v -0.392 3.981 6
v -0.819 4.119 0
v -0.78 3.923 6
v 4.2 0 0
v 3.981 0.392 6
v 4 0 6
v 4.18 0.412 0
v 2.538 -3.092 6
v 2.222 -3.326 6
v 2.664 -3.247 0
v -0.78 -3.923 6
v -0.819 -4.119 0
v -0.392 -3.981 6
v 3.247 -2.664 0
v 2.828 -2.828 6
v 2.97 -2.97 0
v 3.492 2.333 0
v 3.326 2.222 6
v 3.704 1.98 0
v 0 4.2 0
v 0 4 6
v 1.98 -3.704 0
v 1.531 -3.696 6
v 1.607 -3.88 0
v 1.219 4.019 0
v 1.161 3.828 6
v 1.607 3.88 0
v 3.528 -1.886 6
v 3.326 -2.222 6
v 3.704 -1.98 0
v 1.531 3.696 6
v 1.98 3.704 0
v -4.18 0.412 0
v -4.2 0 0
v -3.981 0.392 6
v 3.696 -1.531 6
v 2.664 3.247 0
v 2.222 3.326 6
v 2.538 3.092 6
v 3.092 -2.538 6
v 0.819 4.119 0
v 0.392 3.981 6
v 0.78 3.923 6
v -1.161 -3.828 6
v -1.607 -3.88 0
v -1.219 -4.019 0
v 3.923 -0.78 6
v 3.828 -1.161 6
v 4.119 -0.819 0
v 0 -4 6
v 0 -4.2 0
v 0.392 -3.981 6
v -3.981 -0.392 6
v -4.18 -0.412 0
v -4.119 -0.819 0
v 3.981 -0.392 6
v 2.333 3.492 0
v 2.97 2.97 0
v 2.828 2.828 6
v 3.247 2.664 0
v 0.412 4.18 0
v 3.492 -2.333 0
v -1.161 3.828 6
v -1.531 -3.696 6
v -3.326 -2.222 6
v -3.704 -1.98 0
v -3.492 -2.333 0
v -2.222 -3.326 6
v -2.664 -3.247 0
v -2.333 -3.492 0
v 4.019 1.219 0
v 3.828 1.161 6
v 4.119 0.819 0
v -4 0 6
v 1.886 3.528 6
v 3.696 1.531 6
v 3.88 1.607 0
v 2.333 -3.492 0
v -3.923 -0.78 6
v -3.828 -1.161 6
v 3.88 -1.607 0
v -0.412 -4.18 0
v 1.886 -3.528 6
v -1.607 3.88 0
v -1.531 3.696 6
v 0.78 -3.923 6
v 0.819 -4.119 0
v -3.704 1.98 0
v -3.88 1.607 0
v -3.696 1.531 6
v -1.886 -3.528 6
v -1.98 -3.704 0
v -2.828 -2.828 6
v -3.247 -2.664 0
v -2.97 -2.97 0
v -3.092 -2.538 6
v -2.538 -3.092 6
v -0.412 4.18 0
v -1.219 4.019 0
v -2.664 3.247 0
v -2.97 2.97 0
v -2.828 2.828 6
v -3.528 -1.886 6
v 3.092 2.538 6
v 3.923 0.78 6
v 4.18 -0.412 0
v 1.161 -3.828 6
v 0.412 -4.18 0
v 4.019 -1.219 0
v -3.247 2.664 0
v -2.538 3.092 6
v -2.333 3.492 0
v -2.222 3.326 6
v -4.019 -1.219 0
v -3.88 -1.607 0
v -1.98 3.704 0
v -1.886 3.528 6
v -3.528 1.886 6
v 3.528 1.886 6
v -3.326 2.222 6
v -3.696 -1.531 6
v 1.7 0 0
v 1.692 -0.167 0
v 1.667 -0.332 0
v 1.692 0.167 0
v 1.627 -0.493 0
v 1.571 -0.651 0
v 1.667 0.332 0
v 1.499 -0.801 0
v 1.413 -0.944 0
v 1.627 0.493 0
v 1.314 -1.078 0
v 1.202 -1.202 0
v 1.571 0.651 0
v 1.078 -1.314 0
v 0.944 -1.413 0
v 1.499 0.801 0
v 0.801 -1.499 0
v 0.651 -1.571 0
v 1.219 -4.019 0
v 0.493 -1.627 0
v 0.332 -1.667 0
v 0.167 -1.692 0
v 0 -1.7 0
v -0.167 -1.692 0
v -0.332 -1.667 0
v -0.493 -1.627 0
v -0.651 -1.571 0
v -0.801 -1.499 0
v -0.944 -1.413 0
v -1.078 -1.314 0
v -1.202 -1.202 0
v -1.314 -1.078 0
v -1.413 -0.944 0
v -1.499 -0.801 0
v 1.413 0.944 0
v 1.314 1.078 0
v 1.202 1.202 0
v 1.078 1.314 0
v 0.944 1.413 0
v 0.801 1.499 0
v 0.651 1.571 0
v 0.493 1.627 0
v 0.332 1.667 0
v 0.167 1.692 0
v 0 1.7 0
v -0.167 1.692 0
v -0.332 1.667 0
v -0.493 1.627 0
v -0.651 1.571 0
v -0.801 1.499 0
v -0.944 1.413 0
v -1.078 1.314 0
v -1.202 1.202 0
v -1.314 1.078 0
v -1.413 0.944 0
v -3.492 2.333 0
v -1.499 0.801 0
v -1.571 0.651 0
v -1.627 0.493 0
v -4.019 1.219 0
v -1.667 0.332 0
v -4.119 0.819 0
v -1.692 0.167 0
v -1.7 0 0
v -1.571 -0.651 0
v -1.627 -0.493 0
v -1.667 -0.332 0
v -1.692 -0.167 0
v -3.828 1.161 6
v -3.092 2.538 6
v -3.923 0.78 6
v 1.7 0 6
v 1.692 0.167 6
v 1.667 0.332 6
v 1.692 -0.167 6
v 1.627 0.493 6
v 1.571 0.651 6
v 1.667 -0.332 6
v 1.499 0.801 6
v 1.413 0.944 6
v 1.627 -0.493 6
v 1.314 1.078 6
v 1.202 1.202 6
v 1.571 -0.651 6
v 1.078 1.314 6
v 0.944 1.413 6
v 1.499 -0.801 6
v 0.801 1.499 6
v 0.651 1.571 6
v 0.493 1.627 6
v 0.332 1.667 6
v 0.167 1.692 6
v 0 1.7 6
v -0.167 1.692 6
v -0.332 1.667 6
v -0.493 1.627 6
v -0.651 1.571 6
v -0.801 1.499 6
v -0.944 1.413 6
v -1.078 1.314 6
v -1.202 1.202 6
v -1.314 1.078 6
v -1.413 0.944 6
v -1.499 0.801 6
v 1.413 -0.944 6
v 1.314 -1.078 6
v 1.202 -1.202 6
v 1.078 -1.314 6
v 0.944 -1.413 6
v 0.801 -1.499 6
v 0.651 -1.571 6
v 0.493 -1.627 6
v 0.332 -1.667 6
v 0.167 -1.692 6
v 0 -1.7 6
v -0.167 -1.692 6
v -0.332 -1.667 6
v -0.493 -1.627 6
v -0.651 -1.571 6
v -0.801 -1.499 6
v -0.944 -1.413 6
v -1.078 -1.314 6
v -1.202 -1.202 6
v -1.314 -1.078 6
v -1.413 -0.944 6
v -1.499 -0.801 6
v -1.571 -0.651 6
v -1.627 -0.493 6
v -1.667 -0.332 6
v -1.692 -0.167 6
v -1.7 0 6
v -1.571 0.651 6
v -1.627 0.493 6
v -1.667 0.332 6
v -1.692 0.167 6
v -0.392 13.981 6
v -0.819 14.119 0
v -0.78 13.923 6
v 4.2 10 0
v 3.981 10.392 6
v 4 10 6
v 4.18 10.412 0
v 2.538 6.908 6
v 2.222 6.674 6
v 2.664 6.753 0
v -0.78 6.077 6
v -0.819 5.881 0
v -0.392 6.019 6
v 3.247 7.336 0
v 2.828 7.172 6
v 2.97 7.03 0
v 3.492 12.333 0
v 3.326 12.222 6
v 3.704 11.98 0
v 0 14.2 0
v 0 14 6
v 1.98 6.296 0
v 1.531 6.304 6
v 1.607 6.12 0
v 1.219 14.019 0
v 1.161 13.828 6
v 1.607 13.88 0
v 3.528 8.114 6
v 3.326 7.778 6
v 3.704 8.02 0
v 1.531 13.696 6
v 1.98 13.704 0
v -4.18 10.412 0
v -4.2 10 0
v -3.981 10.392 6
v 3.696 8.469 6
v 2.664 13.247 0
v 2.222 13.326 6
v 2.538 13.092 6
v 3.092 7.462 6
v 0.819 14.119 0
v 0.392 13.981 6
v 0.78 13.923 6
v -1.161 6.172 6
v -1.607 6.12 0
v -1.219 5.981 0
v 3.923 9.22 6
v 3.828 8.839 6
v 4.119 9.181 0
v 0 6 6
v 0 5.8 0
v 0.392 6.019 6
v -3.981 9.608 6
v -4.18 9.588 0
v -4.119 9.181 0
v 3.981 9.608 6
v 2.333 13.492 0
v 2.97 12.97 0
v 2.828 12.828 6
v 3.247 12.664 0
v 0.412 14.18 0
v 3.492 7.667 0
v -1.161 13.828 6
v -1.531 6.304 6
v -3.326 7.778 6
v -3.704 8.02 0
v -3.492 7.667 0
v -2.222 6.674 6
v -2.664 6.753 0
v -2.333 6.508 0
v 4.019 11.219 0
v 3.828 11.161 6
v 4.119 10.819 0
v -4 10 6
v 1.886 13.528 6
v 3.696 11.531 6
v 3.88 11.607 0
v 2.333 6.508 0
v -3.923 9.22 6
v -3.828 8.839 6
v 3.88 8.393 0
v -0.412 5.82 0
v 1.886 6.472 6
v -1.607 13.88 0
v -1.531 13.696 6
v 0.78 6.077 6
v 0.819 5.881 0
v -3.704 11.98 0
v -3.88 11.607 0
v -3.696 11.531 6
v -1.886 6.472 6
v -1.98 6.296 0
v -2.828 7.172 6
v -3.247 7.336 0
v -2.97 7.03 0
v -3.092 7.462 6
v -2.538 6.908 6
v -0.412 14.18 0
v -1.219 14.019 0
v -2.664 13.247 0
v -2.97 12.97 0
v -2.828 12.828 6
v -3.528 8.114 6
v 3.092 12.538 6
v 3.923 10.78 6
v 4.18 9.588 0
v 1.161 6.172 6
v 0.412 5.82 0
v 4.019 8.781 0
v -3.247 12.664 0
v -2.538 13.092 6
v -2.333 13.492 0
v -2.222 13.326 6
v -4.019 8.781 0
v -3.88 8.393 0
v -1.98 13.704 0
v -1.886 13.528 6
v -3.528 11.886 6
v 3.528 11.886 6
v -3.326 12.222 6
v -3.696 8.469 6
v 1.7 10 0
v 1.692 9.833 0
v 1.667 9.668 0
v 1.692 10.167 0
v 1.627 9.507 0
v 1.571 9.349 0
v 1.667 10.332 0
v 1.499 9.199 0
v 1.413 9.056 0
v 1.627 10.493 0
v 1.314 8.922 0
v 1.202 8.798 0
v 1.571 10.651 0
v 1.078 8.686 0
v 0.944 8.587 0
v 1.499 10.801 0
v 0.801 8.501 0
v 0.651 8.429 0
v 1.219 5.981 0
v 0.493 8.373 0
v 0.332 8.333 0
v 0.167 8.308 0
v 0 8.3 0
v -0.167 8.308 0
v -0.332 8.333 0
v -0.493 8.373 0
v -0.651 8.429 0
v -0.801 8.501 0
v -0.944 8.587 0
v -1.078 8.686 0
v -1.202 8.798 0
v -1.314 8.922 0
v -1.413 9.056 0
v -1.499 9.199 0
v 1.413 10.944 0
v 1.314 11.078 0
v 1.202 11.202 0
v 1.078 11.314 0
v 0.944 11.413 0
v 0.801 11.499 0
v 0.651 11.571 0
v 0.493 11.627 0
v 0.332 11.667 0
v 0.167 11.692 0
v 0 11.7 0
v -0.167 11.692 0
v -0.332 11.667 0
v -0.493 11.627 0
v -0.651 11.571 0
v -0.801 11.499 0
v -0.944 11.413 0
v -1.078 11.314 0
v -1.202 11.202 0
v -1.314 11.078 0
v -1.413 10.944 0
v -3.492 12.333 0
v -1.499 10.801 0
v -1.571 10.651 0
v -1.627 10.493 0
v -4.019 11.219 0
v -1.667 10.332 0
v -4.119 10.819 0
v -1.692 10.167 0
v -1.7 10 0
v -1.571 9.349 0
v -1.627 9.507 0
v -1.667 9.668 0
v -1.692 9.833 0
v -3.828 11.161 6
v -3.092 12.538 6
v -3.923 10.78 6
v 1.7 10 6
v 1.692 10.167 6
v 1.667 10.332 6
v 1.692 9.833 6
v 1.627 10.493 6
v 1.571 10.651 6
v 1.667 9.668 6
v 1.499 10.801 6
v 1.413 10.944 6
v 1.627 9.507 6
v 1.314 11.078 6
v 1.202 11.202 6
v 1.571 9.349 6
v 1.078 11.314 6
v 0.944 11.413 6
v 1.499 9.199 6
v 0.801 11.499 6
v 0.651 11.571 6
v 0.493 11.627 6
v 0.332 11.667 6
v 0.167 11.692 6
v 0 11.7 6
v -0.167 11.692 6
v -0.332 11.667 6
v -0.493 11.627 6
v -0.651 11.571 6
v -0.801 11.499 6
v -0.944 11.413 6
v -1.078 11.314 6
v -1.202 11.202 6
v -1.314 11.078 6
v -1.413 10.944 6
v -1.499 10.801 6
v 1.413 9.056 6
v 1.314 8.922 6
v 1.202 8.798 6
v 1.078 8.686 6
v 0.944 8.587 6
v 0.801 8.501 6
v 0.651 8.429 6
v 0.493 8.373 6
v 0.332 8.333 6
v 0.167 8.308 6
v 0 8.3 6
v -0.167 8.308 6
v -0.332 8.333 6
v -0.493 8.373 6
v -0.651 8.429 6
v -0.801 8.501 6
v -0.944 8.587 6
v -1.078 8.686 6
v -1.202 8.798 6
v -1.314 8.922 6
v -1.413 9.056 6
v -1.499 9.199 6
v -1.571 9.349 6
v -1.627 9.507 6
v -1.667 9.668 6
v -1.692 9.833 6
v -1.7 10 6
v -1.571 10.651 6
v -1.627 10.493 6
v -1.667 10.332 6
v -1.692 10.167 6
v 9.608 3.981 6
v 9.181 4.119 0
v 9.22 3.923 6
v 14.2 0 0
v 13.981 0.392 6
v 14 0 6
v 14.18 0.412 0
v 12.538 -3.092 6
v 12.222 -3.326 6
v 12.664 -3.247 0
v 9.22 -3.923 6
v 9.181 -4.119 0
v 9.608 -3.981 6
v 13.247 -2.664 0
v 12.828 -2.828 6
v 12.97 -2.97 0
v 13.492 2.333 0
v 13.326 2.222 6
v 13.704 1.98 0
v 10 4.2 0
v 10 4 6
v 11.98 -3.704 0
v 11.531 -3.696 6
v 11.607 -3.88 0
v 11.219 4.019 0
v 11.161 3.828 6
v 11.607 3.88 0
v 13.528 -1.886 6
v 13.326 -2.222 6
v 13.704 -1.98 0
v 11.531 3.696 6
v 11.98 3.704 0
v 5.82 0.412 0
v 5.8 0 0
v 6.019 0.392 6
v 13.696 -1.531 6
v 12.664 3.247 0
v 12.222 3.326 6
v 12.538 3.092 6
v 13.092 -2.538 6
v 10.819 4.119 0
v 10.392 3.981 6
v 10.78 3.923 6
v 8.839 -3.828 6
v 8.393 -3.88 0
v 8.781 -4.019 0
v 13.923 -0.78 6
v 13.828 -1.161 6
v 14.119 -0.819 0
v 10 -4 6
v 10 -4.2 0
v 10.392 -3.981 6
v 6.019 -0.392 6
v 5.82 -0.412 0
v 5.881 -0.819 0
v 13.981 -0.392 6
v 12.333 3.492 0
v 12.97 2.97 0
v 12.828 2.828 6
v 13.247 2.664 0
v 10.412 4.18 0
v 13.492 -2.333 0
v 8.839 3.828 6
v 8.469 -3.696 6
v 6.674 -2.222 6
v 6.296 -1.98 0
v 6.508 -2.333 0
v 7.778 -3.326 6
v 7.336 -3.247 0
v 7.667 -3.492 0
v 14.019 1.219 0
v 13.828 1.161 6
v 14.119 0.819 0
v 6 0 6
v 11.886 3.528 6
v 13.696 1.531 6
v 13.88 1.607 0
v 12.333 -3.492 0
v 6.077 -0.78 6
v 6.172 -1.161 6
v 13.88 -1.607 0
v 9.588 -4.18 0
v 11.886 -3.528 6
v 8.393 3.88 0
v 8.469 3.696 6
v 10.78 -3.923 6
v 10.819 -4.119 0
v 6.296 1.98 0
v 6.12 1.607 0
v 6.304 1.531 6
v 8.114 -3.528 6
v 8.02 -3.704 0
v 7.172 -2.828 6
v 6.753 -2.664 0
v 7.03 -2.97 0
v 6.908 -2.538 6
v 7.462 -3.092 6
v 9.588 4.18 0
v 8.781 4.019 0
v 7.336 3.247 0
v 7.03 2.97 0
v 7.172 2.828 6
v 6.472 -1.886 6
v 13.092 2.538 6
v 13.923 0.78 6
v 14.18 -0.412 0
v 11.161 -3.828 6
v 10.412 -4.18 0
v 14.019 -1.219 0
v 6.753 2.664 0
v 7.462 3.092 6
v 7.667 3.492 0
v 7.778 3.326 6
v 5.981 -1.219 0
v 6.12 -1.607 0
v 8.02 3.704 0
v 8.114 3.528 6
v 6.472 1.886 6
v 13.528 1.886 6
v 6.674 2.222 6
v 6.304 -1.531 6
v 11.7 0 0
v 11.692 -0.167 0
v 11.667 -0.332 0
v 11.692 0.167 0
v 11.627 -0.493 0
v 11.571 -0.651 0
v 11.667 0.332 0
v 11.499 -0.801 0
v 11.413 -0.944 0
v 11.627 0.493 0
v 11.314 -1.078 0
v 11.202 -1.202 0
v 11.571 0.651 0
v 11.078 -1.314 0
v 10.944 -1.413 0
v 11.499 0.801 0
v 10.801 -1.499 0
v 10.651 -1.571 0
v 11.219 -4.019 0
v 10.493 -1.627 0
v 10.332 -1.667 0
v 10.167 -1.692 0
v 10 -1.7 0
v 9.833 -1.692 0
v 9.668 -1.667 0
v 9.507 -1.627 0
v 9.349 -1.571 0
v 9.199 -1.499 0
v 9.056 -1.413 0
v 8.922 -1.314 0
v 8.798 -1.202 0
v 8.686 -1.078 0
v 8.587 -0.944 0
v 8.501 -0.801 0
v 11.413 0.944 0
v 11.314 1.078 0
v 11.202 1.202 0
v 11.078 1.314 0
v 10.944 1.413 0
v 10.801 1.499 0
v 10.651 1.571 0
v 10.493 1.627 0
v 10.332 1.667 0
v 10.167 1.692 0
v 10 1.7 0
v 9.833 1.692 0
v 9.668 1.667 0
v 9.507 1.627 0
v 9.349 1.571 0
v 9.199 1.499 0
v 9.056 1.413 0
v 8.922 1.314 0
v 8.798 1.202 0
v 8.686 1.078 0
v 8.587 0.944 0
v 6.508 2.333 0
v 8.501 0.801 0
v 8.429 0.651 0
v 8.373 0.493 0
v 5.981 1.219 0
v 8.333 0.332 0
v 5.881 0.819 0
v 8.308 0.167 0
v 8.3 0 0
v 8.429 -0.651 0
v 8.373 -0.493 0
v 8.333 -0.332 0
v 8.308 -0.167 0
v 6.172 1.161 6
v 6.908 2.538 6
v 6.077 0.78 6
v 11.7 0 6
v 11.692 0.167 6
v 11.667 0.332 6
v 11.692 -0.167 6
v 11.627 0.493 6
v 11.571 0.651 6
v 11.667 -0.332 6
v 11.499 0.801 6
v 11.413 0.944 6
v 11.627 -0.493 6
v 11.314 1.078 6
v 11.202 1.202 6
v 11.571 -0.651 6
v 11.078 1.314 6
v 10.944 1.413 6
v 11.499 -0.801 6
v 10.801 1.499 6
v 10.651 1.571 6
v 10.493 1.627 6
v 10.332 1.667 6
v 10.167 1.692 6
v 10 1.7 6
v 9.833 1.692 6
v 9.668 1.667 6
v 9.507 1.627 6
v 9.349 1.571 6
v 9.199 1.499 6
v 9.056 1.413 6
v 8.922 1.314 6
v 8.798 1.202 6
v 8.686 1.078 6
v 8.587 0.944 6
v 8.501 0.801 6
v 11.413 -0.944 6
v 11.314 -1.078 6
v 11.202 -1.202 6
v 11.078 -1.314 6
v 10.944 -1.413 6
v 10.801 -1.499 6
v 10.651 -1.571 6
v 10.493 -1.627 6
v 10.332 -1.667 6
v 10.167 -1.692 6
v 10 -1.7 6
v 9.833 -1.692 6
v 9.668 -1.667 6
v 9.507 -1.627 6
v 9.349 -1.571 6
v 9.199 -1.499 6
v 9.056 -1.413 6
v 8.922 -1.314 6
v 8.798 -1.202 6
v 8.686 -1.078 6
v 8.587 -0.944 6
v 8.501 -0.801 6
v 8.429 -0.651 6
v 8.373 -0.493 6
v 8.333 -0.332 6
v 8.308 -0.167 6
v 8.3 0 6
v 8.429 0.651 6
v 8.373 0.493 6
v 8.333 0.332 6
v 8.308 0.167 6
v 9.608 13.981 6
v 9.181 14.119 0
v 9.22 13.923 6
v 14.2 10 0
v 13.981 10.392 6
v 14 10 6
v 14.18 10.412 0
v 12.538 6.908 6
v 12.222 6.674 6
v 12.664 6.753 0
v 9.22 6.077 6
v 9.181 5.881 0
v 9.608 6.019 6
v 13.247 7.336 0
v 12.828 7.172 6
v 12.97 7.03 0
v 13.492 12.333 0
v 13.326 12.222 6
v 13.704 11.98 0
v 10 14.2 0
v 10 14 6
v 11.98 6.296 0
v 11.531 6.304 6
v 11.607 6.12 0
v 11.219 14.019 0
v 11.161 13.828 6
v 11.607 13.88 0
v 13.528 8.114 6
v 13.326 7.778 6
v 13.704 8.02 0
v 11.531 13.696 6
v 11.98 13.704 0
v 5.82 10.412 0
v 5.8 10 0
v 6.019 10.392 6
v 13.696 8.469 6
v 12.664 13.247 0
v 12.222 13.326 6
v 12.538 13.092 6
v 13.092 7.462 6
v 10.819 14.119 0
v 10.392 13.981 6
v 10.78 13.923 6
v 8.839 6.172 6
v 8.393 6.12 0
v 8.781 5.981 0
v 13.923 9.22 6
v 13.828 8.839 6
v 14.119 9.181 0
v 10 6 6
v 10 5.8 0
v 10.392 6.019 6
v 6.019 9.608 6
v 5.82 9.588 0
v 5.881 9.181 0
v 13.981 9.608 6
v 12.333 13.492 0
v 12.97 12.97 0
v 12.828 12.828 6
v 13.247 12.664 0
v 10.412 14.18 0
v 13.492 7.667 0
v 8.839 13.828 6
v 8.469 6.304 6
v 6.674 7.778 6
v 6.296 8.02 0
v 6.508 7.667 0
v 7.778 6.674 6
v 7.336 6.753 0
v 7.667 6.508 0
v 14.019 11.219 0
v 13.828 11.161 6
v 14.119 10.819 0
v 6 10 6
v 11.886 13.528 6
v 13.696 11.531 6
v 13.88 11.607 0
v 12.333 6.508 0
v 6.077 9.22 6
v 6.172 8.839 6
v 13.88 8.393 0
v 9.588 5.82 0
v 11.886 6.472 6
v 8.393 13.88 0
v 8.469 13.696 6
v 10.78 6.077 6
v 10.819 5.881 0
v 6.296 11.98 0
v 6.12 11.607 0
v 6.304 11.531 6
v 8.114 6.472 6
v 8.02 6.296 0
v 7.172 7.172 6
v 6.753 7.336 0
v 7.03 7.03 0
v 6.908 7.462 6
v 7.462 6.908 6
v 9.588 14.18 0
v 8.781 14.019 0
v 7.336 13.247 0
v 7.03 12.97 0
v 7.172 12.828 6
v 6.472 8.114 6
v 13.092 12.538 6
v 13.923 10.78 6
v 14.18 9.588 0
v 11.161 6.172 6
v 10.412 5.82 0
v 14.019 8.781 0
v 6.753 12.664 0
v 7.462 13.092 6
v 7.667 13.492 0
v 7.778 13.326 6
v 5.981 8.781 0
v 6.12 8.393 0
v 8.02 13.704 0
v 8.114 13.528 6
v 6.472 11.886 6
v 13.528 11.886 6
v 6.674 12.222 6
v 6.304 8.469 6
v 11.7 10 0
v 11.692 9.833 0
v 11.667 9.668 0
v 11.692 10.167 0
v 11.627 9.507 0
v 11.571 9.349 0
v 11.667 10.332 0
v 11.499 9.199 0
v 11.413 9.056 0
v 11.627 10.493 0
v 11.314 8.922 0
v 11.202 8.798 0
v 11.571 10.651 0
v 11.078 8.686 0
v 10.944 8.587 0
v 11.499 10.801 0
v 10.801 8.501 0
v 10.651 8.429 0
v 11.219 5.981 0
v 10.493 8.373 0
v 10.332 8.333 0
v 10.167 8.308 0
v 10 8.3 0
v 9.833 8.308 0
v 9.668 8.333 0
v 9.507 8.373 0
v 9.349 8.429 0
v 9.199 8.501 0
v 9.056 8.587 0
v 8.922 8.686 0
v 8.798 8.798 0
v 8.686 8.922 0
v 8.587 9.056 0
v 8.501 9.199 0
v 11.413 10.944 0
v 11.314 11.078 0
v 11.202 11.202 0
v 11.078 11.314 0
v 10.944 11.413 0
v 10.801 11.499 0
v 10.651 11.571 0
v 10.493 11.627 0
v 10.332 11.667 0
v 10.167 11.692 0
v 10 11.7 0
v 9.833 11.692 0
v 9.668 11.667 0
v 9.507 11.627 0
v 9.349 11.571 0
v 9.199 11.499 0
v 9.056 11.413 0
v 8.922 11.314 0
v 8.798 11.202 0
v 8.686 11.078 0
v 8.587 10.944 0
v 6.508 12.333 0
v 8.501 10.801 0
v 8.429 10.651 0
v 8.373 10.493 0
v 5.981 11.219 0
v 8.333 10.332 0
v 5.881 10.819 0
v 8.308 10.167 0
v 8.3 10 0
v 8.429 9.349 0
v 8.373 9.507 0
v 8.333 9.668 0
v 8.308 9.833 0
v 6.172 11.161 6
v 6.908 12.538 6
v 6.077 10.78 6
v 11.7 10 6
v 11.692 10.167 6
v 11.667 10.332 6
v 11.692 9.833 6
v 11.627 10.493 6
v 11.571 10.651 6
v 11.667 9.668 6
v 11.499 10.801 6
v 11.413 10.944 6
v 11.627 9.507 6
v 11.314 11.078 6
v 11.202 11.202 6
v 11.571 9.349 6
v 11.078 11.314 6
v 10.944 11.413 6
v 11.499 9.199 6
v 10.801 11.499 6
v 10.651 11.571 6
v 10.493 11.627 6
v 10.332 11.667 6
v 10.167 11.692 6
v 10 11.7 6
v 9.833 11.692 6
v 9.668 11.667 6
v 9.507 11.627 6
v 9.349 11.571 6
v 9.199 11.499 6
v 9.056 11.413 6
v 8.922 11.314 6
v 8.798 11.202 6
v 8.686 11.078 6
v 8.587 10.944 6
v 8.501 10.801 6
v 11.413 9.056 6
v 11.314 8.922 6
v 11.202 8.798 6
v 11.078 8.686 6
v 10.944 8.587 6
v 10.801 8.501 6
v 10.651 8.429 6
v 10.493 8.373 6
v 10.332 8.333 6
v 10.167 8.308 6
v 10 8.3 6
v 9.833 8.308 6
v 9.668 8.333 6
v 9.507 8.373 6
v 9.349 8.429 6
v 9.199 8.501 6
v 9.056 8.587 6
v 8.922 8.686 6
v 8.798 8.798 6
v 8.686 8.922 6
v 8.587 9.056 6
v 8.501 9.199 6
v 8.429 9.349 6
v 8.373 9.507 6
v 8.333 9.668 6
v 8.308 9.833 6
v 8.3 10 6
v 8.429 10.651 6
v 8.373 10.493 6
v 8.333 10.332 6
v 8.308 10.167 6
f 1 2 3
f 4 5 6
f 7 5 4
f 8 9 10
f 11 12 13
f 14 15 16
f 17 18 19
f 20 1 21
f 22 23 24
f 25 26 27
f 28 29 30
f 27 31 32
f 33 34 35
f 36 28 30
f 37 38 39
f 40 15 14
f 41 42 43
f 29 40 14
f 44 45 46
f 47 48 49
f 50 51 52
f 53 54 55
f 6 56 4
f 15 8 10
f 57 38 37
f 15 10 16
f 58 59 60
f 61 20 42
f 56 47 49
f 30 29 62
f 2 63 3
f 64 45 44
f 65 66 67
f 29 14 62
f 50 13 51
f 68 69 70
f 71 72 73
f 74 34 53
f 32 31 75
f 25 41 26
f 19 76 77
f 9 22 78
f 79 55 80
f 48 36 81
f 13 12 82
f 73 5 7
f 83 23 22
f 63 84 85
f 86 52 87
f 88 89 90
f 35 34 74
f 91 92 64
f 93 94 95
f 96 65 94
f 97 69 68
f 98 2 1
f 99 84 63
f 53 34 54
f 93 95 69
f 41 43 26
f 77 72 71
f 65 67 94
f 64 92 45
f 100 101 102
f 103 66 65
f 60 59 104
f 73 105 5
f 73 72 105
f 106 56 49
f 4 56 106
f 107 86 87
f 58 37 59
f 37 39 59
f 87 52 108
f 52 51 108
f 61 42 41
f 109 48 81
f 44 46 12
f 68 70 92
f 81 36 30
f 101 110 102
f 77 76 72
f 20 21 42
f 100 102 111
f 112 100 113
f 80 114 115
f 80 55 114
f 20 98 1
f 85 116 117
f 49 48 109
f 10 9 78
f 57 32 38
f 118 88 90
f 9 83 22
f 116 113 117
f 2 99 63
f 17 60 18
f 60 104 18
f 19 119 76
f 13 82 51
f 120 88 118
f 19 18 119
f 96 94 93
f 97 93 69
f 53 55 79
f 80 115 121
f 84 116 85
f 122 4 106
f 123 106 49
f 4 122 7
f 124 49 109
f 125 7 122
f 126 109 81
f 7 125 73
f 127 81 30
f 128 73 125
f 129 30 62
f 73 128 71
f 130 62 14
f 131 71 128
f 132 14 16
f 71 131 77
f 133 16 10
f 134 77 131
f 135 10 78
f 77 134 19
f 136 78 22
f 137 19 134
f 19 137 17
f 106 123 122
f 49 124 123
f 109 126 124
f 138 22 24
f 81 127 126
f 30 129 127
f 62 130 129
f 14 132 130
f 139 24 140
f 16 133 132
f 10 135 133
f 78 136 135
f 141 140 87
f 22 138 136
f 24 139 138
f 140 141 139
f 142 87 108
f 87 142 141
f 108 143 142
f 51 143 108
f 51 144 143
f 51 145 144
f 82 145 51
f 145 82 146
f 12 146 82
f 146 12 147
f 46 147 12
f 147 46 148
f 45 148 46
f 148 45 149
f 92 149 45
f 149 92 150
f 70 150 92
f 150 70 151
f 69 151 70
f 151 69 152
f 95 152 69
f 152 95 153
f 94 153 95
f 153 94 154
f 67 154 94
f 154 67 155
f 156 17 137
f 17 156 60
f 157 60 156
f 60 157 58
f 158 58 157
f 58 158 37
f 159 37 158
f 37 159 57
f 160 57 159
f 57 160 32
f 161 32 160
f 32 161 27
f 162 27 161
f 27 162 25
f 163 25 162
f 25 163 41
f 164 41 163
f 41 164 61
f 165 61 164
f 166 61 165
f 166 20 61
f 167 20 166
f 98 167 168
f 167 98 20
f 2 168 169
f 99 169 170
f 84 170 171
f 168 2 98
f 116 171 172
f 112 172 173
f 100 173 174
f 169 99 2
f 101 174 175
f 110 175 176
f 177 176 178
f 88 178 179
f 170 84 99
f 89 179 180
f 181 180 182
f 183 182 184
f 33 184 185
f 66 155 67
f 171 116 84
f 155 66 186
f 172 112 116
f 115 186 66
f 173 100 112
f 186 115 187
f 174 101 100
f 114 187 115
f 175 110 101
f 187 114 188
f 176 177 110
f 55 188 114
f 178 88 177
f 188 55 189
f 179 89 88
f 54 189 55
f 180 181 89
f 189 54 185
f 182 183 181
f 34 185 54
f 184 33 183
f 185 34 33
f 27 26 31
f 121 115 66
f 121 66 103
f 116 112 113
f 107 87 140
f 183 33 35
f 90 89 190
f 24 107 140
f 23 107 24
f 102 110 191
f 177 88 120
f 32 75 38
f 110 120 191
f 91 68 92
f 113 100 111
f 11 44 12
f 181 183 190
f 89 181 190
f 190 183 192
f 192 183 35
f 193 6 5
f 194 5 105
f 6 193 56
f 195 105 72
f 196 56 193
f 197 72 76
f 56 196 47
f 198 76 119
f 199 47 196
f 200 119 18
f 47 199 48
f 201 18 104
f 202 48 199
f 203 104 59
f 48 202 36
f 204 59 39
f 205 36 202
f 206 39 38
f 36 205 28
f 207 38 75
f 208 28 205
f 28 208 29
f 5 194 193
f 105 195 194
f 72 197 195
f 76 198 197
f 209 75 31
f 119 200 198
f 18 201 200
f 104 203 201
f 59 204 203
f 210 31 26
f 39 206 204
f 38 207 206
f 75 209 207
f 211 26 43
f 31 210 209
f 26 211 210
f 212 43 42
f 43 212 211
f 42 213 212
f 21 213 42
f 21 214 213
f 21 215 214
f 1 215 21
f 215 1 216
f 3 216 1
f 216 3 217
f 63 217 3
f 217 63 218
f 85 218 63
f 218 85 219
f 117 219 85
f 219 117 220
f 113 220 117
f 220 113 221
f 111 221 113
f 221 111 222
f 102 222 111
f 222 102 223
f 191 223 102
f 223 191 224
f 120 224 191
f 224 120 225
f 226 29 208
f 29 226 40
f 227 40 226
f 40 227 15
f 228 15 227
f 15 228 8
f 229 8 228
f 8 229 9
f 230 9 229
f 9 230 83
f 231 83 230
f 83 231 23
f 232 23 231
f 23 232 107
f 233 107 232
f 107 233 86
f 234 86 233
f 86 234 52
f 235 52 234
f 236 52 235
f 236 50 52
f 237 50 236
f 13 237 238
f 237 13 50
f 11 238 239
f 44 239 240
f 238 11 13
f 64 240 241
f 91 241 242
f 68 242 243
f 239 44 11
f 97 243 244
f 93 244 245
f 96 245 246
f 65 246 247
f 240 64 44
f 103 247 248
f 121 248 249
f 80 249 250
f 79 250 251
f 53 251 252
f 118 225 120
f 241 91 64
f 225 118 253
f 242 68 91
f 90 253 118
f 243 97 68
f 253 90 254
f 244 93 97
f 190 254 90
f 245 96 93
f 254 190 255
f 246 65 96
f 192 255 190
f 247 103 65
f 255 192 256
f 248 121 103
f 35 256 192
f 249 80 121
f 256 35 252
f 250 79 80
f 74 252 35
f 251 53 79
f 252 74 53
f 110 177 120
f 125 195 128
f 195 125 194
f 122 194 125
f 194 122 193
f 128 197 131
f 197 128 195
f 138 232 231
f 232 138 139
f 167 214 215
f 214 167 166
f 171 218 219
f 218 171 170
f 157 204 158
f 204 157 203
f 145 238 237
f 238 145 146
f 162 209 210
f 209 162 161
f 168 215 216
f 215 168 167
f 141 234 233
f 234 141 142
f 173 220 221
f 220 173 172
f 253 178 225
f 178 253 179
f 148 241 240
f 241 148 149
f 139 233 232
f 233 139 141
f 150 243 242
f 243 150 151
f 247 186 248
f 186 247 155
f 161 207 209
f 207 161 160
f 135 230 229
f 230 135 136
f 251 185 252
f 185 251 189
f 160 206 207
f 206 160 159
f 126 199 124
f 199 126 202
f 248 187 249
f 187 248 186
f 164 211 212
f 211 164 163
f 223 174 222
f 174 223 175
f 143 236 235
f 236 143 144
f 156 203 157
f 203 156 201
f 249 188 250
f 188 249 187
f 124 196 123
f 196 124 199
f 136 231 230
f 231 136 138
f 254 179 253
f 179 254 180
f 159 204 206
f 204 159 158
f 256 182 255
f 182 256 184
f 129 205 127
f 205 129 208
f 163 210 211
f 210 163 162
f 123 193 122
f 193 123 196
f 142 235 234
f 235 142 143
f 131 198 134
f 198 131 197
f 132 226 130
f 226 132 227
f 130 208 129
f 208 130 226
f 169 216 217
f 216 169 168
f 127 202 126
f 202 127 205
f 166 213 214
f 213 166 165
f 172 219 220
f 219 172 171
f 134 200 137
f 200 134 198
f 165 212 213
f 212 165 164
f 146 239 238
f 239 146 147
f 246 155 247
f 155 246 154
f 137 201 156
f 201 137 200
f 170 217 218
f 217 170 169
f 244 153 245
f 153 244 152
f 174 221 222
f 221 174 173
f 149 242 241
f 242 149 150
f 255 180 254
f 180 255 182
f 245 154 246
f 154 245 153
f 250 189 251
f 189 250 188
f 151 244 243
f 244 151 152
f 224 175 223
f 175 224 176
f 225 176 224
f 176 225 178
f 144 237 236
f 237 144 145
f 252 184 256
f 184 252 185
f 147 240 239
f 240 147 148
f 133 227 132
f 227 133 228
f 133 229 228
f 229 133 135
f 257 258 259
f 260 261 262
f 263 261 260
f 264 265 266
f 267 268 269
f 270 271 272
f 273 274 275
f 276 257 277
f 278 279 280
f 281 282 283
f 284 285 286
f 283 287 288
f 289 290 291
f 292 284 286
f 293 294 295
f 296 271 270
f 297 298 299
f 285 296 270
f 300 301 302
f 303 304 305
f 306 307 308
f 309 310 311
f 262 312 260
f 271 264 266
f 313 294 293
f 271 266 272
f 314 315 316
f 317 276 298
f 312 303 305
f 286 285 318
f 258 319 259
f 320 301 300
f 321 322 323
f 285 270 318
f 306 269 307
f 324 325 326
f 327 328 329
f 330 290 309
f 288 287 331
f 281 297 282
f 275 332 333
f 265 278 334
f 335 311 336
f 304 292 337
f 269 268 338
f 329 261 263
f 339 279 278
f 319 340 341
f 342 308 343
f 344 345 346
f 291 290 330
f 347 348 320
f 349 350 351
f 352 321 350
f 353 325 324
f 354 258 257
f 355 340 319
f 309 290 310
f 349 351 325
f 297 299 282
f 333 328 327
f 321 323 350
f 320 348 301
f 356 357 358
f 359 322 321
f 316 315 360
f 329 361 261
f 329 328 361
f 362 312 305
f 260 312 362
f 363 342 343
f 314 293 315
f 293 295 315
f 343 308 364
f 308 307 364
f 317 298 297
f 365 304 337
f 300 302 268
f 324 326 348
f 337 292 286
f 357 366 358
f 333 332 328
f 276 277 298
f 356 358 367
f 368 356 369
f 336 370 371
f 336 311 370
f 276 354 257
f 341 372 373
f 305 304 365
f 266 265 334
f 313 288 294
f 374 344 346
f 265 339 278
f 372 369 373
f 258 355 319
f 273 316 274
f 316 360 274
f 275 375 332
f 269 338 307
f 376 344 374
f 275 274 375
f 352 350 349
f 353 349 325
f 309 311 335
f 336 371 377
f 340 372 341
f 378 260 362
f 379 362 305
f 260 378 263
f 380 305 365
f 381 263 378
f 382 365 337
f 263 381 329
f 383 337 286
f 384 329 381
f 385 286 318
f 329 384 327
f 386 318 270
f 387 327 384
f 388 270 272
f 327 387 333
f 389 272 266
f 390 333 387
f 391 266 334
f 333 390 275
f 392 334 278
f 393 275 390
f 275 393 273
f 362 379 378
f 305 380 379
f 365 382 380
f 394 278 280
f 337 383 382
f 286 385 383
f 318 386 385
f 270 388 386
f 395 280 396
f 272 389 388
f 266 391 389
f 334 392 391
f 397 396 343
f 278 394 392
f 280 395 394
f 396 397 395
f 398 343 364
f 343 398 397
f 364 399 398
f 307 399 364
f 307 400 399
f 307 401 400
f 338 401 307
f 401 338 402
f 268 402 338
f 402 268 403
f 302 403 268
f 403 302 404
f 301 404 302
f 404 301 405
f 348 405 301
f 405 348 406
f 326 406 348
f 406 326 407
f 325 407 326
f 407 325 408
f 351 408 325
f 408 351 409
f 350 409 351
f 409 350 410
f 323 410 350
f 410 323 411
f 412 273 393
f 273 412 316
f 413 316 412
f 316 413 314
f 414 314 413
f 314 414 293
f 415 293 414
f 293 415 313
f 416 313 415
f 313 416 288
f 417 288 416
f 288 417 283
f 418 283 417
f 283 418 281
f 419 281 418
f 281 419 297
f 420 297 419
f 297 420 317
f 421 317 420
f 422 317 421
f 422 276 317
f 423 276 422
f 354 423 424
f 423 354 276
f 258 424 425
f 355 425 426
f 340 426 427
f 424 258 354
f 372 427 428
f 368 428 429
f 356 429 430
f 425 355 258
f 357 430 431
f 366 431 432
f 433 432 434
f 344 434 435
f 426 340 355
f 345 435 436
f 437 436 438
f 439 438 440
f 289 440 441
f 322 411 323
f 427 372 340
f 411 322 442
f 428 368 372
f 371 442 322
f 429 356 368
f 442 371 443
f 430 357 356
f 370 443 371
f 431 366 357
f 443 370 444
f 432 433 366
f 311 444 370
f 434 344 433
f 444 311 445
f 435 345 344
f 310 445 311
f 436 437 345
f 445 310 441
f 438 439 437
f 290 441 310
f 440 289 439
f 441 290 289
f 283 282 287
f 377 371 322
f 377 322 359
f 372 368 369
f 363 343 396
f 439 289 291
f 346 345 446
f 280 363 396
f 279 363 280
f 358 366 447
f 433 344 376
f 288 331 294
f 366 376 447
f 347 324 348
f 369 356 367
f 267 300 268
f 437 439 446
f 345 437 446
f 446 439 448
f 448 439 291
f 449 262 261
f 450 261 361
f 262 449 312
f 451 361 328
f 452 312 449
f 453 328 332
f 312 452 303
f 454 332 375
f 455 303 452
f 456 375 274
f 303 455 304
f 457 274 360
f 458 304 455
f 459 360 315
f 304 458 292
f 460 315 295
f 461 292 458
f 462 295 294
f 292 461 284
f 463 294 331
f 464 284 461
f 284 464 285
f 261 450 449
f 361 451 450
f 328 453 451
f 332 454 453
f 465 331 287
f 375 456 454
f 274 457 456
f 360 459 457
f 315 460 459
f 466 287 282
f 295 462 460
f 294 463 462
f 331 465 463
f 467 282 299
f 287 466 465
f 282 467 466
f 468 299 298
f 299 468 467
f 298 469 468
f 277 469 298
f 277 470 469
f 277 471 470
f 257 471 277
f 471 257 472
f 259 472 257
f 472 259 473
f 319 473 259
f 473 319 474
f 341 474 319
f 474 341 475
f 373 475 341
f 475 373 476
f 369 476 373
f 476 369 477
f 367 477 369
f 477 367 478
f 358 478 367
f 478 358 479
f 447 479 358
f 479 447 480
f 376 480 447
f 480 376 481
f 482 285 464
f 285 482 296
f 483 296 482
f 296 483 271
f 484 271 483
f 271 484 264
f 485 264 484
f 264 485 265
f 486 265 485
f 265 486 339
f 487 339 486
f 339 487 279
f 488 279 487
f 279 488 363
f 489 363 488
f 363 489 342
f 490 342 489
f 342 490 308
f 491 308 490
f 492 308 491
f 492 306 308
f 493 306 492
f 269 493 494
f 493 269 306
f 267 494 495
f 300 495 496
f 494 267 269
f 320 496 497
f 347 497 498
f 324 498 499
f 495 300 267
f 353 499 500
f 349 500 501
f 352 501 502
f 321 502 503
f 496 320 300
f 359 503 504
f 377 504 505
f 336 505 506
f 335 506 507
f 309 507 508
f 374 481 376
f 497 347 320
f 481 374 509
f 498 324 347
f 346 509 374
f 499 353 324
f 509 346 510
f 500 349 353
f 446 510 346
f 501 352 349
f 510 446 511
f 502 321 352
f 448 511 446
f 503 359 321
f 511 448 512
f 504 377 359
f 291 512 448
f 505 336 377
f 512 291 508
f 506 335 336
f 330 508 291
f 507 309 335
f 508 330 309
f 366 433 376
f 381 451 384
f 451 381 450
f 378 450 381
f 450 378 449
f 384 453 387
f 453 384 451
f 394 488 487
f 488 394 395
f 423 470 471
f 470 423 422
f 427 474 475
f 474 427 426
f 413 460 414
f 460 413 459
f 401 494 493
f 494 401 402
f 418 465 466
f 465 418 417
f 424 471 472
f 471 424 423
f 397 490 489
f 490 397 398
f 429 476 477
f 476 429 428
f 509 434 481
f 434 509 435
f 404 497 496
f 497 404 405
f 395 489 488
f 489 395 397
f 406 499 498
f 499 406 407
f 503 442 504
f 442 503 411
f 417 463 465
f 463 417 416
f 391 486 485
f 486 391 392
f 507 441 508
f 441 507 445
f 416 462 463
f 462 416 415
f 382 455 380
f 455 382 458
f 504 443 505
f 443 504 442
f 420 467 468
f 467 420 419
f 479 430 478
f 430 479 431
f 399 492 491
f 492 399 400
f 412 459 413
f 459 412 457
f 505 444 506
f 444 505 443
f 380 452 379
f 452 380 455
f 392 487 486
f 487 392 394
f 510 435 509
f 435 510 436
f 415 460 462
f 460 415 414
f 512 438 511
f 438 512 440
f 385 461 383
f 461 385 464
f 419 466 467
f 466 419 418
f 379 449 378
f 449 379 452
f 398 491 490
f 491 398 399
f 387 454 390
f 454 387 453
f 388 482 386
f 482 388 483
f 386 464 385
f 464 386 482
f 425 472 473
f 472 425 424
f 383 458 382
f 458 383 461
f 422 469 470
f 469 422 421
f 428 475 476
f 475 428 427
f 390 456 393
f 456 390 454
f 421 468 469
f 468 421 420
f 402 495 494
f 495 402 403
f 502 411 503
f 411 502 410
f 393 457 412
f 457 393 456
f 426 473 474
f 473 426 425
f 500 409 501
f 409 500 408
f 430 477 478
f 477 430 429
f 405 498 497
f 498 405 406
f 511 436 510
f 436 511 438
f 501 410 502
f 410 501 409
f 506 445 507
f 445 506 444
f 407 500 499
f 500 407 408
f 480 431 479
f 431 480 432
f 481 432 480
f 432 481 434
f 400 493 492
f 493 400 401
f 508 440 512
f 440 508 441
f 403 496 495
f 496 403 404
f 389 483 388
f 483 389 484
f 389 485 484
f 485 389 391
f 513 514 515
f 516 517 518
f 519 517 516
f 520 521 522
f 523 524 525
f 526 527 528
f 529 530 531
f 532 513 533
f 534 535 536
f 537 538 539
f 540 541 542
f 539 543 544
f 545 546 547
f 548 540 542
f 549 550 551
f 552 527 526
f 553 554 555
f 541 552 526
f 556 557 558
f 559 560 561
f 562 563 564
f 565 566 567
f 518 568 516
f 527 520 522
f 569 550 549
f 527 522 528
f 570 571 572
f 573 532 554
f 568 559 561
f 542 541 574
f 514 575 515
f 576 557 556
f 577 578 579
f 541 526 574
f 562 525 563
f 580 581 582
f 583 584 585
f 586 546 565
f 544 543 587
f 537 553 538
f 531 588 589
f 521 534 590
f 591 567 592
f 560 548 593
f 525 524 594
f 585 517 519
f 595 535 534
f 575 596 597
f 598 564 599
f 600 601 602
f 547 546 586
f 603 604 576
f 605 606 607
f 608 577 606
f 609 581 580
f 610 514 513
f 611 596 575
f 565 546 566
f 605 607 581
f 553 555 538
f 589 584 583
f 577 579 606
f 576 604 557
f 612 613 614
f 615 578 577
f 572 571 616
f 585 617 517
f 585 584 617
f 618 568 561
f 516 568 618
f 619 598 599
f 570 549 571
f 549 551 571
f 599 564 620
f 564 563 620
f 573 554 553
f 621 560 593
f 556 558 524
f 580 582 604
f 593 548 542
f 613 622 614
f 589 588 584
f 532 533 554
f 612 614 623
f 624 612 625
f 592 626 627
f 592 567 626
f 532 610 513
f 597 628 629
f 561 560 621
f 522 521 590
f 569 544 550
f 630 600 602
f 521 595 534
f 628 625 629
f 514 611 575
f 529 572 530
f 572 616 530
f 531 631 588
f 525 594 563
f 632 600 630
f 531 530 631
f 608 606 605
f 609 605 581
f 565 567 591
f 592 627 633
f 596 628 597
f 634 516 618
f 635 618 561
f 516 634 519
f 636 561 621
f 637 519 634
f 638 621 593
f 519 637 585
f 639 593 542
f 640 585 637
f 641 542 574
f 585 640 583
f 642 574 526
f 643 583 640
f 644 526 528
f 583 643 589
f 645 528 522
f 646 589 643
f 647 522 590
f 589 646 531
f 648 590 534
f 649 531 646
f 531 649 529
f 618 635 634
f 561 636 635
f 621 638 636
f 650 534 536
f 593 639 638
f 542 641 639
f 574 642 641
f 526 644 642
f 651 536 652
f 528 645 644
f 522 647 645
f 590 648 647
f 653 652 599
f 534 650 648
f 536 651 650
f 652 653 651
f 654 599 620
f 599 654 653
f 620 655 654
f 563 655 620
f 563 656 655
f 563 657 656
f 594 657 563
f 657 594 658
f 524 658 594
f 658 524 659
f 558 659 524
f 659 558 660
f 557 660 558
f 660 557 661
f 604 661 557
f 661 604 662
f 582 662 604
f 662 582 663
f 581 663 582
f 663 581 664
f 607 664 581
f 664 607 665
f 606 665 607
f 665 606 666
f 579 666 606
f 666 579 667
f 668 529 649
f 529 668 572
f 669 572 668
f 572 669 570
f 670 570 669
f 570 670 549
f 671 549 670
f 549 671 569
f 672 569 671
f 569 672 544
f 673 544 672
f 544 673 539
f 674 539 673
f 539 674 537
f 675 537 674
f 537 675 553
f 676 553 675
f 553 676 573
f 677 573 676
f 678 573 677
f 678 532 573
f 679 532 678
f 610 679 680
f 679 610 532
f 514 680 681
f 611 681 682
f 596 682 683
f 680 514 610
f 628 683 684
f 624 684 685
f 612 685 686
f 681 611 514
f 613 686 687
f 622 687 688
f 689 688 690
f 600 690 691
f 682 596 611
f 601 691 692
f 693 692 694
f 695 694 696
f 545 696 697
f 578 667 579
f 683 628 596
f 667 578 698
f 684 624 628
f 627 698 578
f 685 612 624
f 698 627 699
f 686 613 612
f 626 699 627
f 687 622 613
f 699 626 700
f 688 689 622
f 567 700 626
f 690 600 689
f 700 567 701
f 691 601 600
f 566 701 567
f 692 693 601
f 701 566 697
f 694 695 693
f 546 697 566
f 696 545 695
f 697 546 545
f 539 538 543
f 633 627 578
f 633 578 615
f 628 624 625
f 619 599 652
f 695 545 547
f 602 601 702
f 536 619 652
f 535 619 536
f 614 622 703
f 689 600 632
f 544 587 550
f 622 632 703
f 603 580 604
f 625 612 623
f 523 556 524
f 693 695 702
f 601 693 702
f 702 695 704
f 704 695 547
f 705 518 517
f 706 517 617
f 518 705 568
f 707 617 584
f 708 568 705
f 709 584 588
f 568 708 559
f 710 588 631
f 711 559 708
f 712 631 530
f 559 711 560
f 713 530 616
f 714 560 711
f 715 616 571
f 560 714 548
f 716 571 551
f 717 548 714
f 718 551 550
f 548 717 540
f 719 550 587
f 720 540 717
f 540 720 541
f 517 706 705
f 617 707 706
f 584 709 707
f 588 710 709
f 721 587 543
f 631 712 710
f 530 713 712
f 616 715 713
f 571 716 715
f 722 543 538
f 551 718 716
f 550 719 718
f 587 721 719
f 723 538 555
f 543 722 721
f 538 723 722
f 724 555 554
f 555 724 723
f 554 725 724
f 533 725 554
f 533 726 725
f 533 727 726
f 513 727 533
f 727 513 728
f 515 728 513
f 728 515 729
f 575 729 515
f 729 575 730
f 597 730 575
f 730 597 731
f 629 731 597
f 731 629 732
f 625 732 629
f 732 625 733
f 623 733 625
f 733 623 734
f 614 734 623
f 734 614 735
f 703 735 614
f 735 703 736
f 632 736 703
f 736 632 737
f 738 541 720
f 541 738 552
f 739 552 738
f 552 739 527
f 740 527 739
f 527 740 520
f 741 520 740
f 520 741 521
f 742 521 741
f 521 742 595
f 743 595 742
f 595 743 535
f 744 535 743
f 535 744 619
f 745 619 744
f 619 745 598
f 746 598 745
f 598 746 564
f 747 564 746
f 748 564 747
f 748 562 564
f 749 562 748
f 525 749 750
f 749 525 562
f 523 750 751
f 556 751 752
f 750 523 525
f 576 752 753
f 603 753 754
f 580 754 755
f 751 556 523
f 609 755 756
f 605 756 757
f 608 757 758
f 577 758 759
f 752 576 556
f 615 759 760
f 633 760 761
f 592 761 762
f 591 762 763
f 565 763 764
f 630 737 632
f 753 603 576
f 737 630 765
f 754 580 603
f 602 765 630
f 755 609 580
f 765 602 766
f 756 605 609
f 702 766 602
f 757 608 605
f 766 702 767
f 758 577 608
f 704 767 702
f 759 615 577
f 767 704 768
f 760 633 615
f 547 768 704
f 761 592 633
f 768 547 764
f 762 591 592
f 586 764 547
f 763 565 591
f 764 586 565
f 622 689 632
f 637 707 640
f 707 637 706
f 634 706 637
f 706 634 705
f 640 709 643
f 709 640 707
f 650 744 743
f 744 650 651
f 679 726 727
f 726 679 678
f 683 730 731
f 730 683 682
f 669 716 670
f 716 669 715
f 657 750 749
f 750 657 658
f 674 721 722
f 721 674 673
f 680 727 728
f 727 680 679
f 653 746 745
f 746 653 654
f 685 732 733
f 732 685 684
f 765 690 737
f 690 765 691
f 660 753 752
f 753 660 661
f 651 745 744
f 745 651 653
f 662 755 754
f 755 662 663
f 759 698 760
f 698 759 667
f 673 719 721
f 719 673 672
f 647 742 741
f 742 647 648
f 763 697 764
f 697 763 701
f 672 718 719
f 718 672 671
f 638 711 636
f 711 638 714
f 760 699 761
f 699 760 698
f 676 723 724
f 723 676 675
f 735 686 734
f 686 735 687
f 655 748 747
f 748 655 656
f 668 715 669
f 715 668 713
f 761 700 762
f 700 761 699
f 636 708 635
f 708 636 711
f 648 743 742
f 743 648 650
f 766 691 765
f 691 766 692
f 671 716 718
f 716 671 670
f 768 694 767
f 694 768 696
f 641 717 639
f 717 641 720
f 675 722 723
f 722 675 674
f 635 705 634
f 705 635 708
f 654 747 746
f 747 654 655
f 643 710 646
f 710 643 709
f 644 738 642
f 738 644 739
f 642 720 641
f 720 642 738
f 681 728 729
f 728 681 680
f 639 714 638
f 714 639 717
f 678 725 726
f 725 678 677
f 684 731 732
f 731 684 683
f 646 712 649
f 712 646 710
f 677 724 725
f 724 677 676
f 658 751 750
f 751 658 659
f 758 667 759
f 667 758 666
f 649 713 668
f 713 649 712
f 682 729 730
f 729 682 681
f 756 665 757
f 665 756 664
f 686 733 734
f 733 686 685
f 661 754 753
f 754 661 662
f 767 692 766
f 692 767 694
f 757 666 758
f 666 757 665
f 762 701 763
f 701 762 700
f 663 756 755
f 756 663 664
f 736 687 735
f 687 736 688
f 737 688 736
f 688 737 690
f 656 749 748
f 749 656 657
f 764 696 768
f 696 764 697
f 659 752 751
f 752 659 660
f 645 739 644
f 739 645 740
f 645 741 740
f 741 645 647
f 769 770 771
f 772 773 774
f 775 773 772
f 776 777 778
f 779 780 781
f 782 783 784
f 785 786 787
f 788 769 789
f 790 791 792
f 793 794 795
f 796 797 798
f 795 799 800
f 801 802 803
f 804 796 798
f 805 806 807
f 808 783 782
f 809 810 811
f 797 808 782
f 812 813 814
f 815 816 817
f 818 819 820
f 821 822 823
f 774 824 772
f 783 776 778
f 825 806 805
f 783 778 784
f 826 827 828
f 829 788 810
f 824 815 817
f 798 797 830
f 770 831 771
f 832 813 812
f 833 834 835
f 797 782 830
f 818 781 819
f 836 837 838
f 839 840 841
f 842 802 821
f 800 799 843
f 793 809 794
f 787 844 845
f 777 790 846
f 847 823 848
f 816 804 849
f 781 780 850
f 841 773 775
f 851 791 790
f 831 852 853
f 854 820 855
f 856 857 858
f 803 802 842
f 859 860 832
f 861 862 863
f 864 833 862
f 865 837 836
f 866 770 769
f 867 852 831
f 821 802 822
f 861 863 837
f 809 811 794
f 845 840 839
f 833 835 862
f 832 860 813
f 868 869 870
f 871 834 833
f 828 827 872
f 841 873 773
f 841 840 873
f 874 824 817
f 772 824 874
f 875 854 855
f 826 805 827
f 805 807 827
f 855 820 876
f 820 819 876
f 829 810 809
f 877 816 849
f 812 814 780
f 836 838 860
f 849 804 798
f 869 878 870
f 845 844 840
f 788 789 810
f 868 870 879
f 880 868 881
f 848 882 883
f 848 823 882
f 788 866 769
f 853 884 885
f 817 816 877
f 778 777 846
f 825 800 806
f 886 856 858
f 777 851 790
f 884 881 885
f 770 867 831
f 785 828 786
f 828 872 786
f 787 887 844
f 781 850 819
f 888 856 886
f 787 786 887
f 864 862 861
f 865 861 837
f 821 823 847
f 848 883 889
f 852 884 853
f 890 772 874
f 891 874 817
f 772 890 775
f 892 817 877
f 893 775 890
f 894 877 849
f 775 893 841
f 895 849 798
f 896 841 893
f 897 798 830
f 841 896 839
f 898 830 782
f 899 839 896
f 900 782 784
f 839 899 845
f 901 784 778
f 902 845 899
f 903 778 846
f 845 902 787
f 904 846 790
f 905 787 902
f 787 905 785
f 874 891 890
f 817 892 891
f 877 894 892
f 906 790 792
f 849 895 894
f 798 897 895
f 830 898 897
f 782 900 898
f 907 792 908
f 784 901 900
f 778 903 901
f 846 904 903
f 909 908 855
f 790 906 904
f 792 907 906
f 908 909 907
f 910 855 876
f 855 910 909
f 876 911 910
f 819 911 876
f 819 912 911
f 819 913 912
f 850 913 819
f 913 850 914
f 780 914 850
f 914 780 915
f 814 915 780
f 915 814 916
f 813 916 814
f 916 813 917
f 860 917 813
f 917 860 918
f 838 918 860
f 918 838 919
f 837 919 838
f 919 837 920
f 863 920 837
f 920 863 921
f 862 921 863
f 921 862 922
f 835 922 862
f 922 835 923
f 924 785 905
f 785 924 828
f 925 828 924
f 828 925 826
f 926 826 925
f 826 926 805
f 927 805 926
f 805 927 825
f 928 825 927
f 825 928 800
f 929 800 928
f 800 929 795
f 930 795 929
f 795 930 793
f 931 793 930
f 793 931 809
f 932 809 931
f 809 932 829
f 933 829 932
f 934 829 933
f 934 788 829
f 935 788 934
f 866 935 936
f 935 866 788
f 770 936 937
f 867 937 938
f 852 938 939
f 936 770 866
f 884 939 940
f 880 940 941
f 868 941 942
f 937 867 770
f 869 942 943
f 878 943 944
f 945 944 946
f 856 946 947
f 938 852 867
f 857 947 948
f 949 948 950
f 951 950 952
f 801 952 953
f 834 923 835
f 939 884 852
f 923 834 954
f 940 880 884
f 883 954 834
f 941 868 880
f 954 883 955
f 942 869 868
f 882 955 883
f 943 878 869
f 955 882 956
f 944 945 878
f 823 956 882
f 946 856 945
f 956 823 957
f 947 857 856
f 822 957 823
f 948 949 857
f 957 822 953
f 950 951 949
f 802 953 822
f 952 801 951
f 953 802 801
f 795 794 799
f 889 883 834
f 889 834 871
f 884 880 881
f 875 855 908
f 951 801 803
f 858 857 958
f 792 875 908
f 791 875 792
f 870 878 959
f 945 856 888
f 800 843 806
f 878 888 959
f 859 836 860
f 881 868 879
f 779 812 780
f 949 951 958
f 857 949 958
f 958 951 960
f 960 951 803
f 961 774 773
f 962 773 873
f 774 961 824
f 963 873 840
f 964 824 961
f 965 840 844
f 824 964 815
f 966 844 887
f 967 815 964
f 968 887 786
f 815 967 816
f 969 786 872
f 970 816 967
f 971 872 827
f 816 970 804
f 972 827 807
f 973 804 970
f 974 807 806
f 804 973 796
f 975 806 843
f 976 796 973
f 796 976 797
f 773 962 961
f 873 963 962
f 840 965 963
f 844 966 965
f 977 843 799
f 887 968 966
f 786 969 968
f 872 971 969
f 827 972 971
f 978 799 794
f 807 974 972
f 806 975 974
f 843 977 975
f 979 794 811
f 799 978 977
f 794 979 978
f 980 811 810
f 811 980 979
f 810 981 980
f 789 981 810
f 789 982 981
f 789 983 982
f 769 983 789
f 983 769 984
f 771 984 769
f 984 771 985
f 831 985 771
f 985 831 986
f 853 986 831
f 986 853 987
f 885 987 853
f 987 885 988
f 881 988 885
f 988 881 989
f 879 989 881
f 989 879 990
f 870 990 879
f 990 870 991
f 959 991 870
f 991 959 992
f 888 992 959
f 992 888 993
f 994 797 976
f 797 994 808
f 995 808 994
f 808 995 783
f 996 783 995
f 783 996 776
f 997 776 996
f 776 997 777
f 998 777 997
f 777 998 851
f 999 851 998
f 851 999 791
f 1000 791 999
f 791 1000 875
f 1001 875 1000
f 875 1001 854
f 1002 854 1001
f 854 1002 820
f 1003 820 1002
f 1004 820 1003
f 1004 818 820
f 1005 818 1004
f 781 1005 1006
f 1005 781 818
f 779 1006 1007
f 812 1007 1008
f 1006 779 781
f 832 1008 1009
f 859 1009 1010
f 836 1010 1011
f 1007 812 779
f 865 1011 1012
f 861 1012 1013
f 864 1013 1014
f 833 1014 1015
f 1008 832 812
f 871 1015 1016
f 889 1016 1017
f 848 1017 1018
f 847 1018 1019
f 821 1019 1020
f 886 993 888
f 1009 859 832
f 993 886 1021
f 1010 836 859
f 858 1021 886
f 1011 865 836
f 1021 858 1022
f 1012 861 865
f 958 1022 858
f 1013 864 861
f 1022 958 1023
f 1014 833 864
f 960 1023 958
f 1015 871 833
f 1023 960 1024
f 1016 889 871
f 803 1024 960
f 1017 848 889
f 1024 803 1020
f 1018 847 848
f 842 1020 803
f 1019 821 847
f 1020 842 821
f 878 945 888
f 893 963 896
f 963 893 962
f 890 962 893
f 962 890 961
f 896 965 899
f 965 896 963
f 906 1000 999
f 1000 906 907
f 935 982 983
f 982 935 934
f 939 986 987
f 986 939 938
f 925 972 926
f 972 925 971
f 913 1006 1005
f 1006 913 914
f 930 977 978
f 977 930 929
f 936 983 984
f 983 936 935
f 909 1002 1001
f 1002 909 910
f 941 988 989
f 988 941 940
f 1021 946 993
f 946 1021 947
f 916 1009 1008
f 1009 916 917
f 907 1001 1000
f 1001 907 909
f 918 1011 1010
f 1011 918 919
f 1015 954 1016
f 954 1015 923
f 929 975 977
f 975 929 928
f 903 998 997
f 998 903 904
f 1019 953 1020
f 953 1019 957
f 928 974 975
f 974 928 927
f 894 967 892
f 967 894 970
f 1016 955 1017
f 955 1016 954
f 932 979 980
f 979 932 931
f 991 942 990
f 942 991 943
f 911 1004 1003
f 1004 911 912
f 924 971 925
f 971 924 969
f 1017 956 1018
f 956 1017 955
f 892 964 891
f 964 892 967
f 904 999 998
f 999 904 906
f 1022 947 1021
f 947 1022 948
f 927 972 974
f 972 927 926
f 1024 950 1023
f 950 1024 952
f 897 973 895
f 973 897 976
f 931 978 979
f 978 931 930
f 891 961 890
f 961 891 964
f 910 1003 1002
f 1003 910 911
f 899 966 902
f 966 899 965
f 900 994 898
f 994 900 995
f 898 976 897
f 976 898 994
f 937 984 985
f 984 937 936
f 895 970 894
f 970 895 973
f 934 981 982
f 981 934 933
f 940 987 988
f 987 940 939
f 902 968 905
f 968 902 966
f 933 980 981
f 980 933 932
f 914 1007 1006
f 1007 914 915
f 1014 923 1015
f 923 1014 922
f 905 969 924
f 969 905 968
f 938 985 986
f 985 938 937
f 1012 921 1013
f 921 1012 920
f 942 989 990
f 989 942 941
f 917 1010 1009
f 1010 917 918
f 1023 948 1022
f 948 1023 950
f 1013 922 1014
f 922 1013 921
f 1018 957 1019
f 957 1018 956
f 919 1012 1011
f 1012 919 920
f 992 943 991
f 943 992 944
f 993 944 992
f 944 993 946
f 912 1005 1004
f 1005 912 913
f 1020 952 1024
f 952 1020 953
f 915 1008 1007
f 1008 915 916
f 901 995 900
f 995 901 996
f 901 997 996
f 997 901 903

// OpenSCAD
$fn=64;


spacing = 10;  // distance between objects
count = 2;     // grid size (4x4)

// Loop through rows and columns
for (x = [0 : count - 1])
    for (y = [0 : count - 1])
        translate([x * spacing, y * spacing, 0])
            difference() {
                cylinder(h=6, d1=8.4, d2=8);
                translate([0,0,-0.01])
                cylinder(h=9, d=3.4);
            }
    
